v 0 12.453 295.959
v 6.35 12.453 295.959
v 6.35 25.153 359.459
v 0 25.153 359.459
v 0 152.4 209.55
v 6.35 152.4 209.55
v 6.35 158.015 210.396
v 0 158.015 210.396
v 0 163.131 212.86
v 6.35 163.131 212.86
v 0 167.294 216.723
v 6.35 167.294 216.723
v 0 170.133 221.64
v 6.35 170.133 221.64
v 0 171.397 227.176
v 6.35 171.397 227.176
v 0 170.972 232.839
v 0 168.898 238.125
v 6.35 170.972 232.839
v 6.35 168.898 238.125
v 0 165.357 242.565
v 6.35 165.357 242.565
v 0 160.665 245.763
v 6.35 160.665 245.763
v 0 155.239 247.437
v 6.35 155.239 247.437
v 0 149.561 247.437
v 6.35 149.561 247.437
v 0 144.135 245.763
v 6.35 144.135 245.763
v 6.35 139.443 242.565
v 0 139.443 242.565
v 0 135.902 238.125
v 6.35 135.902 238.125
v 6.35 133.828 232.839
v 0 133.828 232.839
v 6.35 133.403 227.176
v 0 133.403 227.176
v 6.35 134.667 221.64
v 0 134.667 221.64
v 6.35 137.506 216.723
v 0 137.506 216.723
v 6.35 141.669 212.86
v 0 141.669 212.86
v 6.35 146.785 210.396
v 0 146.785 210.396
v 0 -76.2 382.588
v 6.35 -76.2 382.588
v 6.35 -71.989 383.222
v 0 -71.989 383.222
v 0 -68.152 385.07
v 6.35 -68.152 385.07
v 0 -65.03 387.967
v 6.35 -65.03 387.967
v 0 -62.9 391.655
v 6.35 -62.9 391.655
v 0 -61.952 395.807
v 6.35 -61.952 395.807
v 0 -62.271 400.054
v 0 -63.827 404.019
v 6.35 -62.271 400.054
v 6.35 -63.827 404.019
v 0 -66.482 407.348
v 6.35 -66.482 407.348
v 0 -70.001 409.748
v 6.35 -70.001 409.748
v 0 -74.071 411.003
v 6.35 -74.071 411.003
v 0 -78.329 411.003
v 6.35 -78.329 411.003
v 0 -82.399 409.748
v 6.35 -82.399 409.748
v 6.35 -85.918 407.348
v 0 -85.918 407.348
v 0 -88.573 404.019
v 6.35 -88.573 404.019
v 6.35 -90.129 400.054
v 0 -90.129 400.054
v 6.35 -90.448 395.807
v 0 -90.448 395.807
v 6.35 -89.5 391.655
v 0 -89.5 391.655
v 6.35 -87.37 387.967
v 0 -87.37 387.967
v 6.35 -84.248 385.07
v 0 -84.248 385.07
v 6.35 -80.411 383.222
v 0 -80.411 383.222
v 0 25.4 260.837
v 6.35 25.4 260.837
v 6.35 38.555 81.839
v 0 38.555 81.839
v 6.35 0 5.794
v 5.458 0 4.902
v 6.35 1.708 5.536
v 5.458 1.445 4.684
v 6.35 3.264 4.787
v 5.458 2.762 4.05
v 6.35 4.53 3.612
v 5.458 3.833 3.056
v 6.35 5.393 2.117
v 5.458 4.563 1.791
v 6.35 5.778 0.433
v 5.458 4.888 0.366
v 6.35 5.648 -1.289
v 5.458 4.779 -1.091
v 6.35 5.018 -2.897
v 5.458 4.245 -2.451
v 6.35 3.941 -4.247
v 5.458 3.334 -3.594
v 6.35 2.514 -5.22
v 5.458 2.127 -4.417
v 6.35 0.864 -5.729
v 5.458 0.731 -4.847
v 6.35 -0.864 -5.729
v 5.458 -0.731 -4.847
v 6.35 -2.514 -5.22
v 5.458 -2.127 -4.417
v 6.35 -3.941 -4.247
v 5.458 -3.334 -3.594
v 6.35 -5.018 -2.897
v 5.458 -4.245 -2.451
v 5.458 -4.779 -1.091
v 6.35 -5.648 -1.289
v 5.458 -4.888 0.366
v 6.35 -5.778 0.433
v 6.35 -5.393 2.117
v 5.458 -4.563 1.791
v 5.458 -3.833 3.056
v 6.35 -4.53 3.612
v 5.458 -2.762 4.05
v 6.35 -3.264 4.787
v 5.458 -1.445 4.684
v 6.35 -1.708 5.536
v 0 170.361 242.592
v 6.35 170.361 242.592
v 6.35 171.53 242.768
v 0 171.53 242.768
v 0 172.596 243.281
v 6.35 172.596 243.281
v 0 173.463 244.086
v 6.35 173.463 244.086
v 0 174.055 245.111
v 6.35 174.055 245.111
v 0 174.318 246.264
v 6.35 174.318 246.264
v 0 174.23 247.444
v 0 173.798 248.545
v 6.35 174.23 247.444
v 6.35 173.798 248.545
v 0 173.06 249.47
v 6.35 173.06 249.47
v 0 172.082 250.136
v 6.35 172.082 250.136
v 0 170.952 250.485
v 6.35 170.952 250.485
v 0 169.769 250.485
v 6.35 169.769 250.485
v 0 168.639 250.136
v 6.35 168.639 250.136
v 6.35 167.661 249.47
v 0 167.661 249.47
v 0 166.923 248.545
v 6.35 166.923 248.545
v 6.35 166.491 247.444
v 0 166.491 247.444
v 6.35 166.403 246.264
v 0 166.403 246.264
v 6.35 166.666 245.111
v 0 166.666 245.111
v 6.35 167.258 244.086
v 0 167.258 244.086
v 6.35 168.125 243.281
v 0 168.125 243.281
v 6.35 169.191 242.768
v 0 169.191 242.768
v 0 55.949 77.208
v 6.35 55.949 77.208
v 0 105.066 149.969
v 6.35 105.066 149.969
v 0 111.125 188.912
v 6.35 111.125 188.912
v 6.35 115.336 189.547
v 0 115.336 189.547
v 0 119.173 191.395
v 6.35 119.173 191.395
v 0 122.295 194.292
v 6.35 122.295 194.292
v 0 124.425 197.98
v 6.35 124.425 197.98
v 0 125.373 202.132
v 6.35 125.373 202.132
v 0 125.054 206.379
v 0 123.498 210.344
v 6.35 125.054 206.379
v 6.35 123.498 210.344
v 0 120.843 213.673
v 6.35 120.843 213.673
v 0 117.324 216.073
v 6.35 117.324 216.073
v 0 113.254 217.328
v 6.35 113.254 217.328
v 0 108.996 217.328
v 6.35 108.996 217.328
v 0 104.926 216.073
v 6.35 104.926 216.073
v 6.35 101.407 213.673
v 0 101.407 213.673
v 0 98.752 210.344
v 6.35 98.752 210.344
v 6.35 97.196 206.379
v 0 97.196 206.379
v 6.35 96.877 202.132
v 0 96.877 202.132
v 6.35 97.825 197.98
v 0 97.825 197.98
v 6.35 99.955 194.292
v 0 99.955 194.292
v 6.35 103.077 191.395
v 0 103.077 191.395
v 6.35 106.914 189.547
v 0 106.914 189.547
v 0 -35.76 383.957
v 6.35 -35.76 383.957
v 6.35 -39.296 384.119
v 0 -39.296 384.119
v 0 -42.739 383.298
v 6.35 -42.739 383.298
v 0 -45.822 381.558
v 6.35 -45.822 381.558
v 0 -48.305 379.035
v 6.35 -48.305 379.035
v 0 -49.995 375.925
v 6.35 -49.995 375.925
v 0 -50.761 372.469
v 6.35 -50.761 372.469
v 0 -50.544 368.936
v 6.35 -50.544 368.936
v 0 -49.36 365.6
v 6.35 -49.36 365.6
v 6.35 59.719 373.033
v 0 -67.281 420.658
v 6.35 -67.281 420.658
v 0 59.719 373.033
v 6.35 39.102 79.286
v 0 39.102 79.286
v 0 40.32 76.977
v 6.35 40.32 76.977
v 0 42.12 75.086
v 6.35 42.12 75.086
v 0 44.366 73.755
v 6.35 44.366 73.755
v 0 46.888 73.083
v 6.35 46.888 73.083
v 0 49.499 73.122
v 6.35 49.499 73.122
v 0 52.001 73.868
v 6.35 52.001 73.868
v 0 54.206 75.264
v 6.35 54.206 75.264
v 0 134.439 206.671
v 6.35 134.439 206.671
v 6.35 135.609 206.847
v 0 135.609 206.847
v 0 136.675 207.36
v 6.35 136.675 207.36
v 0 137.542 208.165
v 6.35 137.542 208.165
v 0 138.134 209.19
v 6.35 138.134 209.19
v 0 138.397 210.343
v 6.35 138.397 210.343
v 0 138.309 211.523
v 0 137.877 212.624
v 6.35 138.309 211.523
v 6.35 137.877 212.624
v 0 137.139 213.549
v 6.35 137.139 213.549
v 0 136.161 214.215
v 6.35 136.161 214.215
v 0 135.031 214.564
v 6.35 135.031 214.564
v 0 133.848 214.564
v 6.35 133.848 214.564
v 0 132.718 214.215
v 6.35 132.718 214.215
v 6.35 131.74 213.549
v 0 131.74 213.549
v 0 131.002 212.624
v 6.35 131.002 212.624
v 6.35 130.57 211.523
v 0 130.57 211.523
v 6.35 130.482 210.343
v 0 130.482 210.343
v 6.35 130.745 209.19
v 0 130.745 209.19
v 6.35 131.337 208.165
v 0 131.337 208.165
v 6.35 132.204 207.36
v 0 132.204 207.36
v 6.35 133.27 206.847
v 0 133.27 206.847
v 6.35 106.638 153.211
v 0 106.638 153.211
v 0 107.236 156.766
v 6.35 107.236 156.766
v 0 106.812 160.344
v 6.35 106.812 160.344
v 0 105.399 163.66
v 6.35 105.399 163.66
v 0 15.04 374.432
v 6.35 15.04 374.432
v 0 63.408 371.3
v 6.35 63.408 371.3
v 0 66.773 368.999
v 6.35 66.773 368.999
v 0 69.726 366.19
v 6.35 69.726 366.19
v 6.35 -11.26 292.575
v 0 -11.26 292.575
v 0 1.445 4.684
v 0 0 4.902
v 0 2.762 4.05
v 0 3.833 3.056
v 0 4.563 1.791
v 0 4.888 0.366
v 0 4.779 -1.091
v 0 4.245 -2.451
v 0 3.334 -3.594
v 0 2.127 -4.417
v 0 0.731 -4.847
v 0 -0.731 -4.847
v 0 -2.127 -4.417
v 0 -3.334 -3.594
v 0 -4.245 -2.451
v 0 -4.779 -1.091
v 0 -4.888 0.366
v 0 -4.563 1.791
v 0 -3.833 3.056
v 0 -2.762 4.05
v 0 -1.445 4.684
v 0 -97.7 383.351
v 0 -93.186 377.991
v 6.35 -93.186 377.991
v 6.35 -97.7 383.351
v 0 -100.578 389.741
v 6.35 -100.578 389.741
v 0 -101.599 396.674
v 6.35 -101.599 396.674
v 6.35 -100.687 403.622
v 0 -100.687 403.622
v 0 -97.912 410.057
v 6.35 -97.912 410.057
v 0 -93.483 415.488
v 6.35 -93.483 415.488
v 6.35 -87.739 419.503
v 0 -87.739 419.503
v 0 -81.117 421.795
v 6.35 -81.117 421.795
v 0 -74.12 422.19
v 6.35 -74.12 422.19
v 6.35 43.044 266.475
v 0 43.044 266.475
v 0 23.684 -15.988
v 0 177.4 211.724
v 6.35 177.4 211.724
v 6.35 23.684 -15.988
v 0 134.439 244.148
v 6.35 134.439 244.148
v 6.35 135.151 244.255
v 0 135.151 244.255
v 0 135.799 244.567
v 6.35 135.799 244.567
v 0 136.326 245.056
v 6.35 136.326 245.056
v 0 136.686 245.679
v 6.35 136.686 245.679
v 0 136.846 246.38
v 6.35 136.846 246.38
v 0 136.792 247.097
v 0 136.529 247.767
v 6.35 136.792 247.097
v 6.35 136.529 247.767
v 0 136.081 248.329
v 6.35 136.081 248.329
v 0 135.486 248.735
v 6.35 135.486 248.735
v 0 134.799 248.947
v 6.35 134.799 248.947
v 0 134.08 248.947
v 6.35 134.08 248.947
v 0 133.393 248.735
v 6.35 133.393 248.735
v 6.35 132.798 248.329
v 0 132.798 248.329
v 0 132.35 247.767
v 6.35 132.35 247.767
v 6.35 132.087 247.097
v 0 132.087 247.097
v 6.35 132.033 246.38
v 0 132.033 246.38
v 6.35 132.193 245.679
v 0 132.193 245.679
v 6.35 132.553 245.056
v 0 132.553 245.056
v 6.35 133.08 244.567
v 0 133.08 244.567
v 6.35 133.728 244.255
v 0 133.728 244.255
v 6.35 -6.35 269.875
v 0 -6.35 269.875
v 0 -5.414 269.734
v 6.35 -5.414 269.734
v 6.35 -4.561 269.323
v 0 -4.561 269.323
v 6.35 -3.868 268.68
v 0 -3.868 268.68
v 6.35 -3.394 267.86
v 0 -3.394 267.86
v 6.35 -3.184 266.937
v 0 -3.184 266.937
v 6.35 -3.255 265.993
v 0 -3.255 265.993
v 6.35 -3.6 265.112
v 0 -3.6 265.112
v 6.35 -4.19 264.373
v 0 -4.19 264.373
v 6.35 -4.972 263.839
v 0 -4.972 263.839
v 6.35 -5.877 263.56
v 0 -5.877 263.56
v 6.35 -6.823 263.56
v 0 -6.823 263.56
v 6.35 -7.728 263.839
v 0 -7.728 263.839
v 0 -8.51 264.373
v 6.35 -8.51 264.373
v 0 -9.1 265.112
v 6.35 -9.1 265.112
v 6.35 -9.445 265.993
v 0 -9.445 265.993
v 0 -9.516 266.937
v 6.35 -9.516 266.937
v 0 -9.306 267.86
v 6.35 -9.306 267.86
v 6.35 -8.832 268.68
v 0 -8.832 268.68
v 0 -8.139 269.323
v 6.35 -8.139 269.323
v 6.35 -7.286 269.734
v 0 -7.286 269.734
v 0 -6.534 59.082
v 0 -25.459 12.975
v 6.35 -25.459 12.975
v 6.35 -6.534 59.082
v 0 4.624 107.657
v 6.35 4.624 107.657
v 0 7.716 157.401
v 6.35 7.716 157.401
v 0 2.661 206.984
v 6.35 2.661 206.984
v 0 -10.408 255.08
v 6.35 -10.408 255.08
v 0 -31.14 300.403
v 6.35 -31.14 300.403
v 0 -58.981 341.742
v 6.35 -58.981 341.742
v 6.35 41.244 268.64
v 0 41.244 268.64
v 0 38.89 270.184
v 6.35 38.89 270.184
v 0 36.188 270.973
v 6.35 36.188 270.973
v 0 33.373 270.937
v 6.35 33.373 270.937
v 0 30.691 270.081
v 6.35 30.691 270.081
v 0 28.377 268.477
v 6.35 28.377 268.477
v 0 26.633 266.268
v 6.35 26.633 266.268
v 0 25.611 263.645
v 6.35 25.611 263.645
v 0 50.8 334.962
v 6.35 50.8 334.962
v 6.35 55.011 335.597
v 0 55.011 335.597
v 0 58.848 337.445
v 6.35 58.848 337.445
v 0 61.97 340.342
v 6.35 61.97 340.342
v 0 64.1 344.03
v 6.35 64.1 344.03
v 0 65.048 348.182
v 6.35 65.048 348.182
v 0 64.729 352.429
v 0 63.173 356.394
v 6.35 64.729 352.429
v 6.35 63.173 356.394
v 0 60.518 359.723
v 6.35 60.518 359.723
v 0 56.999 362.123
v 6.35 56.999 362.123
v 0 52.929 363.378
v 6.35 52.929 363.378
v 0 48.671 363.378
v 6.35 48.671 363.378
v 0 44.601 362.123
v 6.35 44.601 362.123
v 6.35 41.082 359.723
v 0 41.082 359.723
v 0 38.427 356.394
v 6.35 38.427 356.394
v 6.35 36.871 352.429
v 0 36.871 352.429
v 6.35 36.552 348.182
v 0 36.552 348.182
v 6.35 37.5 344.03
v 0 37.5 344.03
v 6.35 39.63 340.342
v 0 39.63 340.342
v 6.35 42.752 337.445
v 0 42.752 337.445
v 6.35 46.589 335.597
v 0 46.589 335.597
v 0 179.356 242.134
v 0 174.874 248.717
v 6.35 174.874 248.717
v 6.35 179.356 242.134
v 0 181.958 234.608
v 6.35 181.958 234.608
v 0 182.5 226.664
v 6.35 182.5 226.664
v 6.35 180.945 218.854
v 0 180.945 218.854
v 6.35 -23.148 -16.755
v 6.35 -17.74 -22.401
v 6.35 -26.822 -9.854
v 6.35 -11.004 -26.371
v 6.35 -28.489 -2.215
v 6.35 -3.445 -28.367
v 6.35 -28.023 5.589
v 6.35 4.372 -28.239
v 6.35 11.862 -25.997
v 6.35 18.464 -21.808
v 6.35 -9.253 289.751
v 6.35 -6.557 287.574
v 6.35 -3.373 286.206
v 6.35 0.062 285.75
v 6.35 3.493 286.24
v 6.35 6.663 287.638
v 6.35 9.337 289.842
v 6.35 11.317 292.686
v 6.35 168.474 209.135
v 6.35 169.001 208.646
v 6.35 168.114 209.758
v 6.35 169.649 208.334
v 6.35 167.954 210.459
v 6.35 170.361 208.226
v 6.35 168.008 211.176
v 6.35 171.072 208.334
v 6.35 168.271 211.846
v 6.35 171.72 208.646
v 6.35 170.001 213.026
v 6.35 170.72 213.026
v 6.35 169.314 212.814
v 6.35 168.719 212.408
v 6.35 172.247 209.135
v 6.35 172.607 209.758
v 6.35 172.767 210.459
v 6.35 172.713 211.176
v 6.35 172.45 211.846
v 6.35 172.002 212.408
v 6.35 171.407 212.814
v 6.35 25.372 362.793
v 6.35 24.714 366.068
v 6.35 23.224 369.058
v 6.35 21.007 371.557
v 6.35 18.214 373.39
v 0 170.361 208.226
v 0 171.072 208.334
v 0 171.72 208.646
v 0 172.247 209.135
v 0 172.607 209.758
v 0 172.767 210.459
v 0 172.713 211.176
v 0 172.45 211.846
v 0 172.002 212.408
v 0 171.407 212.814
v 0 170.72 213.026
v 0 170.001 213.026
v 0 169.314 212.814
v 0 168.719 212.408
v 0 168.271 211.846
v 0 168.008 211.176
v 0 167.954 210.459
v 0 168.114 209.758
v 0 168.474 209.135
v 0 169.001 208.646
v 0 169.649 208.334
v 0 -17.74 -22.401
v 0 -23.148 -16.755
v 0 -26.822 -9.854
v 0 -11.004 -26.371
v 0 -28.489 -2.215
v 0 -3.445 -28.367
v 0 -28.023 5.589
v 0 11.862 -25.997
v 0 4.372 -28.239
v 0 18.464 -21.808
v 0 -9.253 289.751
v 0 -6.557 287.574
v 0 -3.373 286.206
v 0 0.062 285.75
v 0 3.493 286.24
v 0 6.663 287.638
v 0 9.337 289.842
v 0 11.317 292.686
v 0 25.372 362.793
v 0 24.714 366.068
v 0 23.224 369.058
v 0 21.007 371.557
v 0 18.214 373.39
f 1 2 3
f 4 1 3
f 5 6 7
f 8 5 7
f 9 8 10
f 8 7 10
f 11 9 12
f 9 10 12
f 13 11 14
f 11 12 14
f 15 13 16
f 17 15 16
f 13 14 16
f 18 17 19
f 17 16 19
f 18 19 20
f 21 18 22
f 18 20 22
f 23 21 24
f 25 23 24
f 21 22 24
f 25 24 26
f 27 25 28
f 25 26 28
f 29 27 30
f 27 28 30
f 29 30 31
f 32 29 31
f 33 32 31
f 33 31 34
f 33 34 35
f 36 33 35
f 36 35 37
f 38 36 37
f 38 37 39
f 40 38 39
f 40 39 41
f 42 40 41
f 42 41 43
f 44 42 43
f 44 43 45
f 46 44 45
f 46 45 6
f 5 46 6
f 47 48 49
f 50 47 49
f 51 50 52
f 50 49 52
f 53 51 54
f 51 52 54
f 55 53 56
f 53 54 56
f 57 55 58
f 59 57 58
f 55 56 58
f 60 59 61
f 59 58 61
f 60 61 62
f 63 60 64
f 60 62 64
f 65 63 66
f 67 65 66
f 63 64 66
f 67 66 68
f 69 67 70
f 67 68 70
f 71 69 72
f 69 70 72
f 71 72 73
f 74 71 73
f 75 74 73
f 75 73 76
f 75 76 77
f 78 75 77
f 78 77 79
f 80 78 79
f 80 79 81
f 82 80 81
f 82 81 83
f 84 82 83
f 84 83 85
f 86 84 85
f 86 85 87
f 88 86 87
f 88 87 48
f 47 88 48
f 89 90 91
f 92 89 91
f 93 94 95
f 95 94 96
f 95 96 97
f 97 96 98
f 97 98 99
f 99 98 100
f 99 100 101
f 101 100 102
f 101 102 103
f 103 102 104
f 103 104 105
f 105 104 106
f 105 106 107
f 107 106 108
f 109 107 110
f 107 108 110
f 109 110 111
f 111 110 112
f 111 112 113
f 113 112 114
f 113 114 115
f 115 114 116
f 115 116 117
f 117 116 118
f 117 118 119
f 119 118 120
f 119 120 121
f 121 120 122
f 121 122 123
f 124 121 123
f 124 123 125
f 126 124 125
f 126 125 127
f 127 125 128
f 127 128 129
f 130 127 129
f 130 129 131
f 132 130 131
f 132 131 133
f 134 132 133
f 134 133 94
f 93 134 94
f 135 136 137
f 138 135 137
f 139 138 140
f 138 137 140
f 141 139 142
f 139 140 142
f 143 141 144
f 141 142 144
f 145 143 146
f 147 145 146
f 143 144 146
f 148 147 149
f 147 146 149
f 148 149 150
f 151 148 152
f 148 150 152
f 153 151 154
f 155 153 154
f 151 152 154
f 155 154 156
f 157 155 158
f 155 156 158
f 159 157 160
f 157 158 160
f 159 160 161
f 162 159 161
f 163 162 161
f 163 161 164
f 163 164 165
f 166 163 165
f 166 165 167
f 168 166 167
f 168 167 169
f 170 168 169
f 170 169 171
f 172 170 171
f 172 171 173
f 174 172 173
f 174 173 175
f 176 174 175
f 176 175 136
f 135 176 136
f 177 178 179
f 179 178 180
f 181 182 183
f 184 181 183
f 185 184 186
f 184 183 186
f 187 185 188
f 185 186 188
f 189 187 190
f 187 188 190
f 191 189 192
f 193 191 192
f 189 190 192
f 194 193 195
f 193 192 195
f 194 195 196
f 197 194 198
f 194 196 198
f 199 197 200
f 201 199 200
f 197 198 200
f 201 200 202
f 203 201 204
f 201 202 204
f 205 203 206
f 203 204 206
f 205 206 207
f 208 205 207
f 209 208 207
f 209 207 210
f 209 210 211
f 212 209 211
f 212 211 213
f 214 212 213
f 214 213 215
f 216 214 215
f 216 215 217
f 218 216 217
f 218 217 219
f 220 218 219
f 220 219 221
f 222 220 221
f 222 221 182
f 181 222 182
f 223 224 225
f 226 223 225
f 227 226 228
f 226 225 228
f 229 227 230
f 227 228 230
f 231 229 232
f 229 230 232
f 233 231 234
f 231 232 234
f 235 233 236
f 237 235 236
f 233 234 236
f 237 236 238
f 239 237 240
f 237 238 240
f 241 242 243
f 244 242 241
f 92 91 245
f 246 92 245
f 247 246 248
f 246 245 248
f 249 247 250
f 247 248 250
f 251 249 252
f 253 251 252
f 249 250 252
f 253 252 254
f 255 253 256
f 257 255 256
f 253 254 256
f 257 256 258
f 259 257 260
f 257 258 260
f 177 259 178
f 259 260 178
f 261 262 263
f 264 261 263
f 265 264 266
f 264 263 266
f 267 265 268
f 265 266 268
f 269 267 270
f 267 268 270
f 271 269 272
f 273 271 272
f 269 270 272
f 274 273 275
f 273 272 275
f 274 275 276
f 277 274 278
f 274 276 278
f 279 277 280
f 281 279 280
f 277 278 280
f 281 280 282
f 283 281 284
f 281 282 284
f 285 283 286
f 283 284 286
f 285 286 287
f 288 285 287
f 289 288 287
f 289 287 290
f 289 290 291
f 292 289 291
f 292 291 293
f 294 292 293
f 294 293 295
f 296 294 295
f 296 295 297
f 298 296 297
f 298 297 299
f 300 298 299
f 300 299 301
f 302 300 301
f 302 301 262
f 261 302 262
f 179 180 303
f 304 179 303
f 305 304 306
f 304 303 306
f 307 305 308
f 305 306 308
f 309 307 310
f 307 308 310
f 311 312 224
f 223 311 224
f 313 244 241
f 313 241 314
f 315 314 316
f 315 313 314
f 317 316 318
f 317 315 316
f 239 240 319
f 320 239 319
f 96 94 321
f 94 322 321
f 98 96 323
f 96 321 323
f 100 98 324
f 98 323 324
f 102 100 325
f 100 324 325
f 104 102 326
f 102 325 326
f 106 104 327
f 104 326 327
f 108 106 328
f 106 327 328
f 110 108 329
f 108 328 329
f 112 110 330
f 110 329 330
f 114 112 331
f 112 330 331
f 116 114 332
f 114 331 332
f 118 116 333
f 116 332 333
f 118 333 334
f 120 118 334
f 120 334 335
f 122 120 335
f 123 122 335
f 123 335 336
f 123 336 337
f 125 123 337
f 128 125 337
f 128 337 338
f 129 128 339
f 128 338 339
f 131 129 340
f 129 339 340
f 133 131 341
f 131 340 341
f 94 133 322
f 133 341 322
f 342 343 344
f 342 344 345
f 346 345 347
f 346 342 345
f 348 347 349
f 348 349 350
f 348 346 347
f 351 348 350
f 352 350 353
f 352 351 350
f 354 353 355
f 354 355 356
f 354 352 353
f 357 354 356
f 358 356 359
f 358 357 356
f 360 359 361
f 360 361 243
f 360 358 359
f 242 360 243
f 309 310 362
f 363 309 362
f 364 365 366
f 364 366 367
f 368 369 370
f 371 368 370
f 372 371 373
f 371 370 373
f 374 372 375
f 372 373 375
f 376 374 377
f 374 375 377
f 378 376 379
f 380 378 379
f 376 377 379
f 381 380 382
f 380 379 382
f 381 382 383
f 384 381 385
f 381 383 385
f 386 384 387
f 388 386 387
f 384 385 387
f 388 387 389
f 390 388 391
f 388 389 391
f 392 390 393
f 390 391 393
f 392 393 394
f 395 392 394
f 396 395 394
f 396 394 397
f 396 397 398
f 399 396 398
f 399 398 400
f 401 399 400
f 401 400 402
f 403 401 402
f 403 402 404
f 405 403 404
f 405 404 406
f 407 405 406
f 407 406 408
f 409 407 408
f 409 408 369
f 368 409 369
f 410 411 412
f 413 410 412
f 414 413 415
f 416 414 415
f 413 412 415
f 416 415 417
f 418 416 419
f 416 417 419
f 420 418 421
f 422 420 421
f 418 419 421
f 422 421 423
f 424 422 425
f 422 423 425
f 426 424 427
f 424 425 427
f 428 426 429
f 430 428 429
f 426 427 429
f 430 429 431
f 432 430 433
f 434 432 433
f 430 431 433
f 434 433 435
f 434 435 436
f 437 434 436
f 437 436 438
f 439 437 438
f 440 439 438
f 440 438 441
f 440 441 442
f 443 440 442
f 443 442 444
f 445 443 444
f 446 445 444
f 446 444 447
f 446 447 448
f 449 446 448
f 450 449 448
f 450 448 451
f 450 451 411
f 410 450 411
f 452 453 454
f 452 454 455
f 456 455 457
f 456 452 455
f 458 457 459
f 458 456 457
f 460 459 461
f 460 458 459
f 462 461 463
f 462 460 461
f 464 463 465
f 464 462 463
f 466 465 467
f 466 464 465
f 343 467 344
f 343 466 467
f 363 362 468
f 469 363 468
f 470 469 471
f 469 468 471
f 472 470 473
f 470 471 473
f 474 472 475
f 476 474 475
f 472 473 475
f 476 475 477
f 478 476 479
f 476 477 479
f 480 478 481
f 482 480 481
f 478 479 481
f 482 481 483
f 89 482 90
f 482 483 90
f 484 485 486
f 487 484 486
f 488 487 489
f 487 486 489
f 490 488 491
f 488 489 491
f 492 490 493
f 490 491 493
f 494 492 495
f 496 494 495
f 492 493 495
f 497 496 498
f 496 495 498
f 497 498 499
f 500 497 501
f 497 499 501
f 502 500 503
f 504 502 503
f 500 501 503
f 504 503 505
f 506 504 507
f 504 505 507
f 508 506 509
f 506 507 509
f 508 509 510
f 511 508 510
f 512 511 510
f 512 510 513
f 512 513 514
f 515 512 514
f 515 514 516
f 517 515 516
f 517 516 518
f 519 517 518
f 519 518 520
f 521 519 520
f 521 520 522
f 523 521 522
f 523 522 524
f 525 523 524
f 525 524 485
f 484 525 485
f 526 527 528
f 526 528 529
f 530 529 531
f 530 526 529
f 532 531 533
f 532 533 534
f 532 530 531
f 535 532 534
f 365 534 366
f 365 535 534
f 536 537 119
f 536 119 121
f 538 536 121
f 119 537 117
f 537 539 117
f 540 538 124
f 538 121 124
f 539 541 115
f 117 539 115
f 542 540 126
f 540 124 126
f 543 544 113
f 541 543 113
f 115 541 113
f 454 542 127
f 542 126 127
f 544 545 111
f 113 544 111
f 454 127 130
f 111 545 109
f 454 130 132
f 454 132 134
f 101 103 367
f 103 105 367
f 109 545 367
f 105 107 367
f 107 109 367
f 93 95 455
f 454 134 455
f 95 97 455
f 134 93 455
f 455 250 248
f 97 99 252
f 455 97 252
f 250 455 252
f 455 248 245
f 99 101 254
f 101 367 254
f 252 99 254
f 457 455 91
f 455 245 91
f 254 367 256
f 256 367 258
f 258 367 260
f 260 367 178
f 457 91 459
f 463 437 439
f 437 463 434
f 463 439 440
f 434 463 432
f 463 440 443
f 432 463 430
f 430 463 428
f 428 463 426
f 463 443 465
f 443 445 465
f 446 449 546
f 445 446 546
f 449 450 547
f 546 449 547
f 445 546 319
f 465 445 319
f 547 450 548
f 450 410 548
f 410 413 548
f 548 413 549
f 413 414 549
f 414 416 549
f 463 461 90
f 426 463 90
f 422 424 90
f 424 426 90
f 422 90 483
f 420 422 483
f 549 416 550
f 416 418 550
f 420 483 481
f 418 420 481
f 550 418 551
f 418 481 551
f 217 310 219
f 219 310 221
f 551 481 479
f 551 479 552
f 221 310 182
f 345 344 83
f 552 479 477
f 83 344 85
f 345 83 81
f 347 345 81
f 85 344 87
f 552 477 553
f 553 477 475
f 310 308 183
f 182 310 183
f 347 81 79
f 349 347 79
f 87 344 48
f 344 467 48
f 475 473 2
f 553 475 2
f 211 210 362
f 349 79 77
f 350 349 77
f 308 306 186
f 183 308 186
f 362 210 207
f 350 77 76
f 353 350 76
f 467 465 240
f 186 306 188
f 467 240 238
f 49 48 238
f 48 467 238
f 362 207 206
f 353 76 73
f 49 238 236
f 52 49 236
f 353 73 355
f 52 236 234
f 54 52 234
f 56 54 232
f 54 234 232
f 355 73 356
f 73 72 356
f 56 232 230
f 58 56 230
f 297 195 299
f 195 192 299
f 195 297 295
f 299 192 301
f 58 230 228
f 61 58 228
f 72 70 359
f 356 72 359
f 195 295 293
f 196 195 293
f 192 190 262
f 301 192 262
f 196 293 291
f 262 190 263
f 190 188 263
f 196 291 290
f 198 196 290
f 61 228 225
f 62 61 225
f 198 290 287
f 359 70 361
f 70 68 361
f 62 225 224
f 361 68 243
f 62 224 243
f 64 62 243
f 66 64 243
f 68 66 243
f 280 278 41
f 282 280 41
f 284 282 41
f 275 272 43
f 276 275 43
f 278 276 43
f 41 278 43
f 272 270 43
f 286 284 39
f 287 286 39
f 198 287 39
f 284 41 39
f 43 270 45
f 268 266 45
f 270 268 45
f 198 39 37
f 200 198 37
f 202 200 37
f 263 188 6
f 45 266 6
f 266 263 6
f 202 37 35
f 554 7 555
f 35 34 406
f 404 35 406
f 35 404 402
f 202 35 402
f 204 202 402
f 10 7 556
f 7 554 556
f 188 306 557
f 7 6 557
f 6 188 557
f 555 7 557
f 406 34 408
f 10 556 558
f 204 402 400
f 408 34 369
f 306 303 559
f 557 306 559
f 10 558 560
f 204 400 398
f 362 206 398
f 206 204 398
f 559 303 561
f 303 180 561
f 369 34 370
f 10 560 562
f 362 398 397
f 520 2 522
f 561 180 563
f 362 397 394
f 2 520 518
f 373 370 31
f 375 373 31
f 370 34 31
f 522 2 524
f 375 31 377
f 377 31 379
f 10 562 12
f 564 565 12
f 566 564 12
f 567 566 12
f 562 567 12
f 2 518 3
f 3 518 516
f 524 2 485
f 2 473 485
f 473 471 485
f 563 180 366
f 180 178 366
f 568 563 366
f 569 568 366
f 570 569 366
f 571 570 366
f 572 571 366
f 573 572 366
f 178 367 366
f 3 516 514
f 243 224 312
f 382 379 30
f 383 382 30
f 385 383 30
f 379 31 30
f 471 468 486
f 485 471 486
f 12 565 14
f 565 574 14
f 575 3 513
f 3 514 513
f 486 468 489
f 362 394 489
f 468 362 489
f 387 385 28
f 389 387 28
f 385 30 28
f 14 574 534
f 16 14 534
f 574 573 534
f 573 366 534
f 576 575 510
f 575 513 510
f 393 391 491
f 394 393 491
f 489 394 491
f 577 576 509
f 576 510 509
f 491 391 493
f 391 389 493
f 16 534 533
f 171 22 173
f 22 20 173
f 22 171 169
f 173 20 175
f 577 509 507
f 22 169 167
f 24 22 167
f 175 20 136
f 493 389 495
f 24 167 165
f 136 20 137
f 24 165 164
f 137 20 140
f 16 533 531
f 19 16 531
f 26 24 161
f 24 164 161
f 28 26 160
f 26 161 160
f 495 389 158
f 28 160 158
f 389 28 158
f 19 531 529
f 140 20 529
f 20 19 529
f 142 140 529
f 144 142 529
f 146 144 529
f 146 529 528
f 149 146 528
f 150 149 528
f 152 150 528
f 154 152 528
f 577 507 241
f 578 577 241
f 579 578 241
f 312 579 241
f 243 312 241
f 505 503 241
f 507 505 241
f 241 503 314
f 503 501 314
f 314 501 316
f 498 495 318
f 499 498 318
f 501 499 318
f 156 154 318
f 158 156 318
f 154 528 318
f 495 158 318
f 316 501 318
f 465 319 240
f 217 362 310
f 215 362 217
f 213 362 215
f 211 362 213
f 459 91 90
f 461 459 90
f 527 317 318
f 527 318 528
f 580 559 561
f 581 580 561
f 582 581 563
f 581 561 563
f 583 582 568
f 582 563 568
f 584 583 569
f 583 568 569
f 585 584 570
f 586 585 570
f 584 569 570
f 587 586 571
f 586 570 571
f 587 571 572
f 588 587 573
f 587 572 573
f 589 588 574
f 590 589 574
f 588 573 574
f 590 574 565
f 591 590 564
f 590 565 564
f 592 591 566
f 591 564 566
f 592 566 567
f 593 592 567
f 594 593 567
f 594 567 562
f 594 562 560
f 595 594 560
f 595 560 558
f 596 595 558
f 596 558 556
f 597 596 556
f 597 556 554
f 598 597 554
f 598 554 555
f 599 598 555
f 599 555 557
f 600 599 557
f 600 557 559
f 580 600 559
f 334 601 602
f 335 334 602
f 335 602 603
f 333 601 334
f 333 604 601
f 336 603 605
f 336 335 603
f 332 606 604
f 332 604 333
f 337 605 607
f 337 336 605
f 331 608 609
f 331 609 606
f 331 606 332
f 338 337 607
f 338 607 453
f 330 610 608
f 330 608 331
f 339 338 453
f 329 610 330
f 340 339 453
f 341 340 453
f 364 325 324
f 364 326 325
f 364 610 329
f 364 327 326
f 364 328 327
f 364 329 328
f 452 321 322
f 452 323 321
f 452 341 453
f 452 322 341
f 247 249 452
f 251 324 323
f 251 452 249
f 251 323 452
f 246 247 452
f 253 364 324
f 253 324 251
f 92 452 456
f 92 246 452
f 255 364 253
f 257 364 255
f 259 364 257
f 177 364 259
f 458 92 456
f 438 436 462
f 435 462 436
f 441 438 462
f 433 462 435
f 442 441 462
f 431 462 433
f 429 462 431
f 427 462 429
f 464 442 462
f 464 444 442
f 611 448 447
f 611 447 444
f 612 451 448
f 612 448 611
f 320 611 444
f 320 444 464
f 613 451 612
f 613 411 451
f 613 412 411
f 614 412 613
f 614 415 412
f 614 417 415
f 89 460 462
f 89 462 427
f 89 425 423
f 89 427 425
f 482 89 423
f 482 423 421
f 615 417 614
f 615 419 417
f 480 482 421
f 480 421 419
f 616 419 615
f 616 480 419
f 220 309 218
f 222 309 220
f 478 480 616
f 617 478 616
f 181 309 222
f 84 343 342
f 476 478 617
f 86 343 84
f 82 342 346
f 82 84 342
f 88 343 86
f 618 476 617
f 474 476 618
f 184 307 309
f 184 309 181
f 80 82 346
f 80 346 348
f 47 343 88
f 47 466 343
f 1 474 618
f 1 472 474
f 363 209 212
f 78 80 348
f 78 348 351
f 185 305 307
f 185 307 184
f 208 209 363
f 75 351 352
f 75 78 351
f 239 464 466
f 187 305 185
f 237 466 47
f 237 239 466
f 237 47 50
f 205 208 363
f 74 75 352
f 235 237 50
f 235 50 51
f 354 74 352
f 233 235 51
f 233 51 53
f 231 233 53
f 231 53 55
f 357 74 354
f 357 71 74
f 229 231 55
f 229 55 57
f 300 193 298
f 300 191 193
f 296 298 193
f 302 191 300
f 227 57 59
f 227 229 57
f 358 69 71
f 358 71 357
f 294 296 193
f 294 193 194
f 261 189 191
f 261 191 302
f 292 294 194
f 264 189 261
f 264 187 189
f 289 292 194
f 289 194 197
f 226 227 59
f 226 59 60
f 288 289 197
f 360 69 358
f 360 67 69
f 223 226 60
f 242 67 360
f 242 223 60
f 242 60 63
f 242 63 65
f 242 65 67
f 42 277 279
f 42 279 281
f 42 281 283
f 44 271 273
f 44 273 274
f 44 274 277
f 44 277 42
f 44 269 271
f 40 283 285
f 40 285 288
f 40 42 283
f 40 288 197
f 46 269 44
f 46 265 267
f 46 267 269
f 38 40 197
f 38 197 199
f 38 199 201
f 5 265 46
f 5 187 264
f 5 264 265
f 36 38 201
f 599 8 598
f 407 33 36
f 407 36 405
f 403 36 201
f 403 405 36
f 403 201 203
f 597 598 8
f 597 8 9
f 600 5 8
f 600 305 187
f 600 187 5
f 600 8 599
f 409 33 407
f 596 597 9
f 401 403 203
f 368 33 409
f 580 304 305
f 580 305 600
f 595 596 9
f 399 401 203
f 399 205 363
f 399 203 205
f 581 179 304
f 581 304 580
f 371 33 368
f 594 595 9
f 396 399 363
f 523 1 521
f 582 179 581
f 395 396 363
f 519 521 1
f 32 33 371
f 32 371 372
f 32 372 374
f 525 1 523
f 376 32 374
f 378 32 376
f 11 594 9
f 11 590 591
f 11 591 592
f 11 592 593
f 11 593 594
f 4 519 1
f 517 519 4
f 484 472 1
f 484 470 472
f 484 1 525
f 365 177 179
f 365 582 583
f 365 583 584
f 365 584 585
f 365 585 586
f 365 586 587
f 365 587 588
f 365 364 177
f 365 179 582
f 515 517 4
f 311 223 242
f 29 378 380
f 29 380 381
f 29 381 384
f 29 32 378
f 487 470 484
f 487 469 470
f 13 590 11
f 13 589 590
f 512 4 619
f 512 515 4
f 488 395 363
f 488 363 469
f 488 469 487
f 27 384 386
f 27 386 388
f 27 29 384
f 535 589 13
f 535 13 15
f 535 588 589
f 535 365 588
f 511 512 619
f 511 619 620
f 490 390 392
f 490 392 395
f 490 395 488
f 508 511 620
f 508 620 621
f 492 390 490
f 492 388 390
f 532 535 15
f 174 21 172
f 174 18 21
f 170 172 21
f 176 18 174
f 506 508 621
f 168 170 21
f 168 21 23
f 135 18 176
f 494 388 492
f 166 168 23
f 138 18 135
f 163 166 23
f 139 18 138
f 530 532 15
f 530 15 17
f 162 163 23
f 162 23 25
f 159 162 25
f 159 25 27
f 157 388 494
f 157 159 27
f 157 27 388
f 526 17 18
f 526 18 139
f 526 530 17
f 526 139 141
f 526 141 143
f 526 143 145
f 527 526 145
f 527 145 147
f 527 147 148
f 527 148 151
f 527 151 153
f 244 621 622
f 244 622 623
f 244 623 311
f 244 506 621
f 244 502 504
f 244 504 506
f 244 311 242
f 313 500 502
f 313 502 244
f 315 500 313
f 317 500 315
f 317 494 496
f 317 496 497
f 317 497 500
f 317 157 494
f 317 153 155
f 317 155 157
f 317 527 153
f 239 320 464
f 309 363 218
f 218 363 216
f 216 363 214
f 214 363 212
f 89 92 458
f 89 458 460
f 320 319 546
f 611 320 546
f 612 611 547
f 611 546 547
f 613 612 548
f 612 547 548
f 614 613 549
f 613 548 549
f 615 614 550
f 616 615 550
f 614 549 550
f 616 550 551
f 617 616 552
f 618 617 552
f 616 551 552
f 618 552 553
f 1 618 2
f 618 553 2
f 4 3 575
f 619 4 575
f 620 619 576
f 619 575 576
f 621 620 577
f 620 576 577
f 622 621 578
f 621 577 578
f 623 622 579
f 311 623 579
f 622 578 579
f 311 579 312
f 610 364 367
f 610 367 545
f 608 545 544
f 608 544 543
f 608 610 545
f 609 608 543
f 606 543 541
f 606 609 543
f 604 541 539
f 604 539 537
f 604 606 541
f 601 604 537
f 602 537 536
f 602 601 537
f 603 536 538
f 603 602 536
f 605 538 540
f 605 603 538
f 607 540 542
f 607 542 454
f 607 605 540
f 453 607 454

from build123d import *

# Parameters (mm, degrees)
BOSS_EXTRUDE1_DEPTH               = 6.35
CUT_EXTRUDE1_REACH                = 8.35
SKETCH3_R                         = 14.2875
SKETCH3_R_2                       = 19.05
SKETCH3_R_3                       = 2.413
SKETCH3_R_4                       = 3.96875
F_3_8_CLEARANCE_HOLE2_D           = 9.8044
F_3_8_CLEARANCE_HOLE2_CSINK_D     = 11.58748
F_3_8_CLEARANCE_HOLE2_CSINK_ANGLE = 90
F_1_4_0_2500_DOWEL_HOLE2_D        = 6.35
CUT_EXTRUDE2_DEPTH                = 7.35


with BuildPart() as part:
    # Sketch2 → Boss-Extrude1 (new body)
    with BuildSketch(Plane(origin=(0, 0, 0), x_dir=(0, 0, -1), z_dir=(1, 0, 0))):
        with BuildLine():
            Line((-420.65776111, -67.281464584), (-373.03276111, 59.718535416))
            ThreePointArc((-373.03276111, 59.718535416), (-370.217283815, 65.136422477), (-366.190217158, 69.725882876))
            Line((-366.190217158, 69.725882876), (-248.716507876, 174.874485915))
            ThreePointArc((-248.716507876, 174.874485915), (-230.65414247, 182.492472563), (-211.724122614, 177.399623371))
            Line((-211.724122614, 177.399623371), (15.987673313, 23.68385372))
            ThreePointArc((15.987673313, 23.68385372), (24.617664495, -14.508660165), (-12.975284095, -25.459234624))
            ThreePointArc((-12.975284095, -25.459234624), (-206.983757432, 2.660555148), (-377.990639572, -93.186492612))
            ThreePointArc((-377.990639572, -93.186492612), (-410.057040874, -97.911605155), (-420.65776111, -67.281464584))
        make_face()
    extrude(amount=BOSS_EXTRUDE1_DEPTH)

    # Sketch3 → Cut-Extrude1 (cut, up to next)
    with BuildSketch(Plane(origin=(6.35, 0, 0), x_dir=(0, 0, -1), z_dir=(1, 0, 0)), mode=Mode.PRIVATE) as cut_extrude1_sk1:
        with Locations((-203.2, 111.125)):
            Circle(SKETCH3_R)
    cut_extrude1_tool1 = extrude(cut_extrude1_sk1.sketch, amount=-CUT_EXTRUDE1_REACH, mode=Mode.PRIVATE) & part.part
    add(cut_extrude1_tool1.solids().sort_by_distance((6.35, 111.125, 203.2))[0], mode=Mode.SUBTRACT)
    # Sketch3 → Cut-Extrude1 (cut, up to next)
    with BuildSketch(Plane(origin=(6.35, 0, 0), x_dir=(0, 0, -1), z_dir=(1, 0, 0)), mode=Mode.PRIVATE) as cut_extrude1_sk2:
        with Locations((-349.25, 50.8)):
            Circle(SKETCH3_R)
    cut_extrude1_tool2 = extrude(cut_extrude1_sk2.sketch, amount=-CUT_EXTRUDE1_REACH, mode=Mode.PRIVATE) & part.part
    add(cut_extrude1_tool2.solids().sort_by_distance((6.35, 50.8, 349.25))[0], mode=Mode.SUBTRACT)
    # Sketch3 → Cut-Extrude1 (cut, up to next)
    with BuildSketch(Plane(origin=(6.35, 0, 0), x_dir=(0, 0, -1), z_dir=(1, 0, 0)), mode=Mode.PRIVATE) as cut_extrude1_sk3:
        with Locations((-396.875, -76.2)):
            Circle(SKETCH3_R)
    cut_extrude1_tool3 = extrude(cut_extrude1_sk3.sketch, amount=-CUT_EXTRUDE1_REACH, mode=Mode.PRIVATE) & part.part
    add(cut_extrude1_tool3.solids().sort_by_distance((6.35, -76.2, 396.875))[0], mode=Mode.SUBTRACT)
    # Sketch3 → Cut-Extrude1 (cut, up to next)
    with BuildSketch(Plane(origin=(6.35, 0, 0), x_dir=(0, 0, -1), z_dir=(1, 0, 0)), mode=Mode.PRIVATE) as cut_extrude1_sk4:
        with Locations((-228.6, 152.4)):
            Circle(SKETCH3_R_2)
    cut_extrude1_tool4 = extrude(cut_extrude1_sk4.sketch, amount=-CUT_EXTRUDE1_REACH, mode=Mode.PRIVATE) & part.part
    add(cut_extrude1_tool4.solids().sort_by_distance((6.35, 152.4, 228.6))[0], mode=Mode.SUBTRACT)
    # Sketch3 → Cut-Extrude1 (cut, up to next)
    with BuildSketch(Plane(origin=(6.35, 0, 0), x_dir=(0, 0, -1), z_dir=(1, 0, 0)), mode=Mode.PRIVATE) as cut_extrude1_sk5:
        with Locations((-246.560512242, 134.439487758)):
            Circle(SKETCH3_R_3)
    cut_extrude1_tool5 = extrude(cut_extrude1_sk5.sketch, amount=-CUT_EXTRUDE1_REACH, mode=Mode.PRIVATE) & part.part
    add(cut_extrude1_tool5.solids().sort_by_distance((6.35, 134.439488, 246.560512))[0], mode=Mode.SUBTRACT)
    # Sketch3 → Cut-Extrude1 (cut, up to next)
    with BuildSketch(Plane(origin=(6.35, 0, 0), x_dir=(0, 0, -1), z_dir=(1, 0, 0)), mode=Mode.PRIVATE) as cut_extrude1_sk6:
        with Locations((-210.639487758, 134.439487758)):
            Circle(SKETCH3_R_4)
    cut_extrude1_tool6 = extrude(cut_extrude1_sk6.sketch, amount=-CUT_EXTRUDE1_REACH, mode=Mode.PRIVATE) & part.part
    add(cut_extrude1_tool6.solids().sort_by_distance((6.35, 134.439488, 210.639488))[0], mode=Mode.SUBTRACT)
    # Sketch3 → Cut-Extrude1 (cut, up to next)
    with BuildSketch(Plane(origin=(6.35, 0, 0), x_dir=(0, 0, -1), z_dir=(1, 0, 0)), mode=Mode.PRIVATE) as cut_extrude1_sk7:
        with Locations((-210.639487758, 170.360512242)):
            Circle(SKETCH3_R_3)
    cut_extrude1_tool7 = extrude(cut_extrude1_sk7.sketch, amount=-CUT_EXTRUDE1_REACH, mode=Mode.PRIVATE) & part.part
    add(cut_extrude1_tool7.solids().sort_by_distance((6.35, 170.360512, 210.639488))[0], mode=Mode.SUBTRACT)
    # Sketch3 → Cut-Extrude1 (cut, up to next)
    with BuildSketch(Plane(origin=(6.35, 0, 0), x_dir=(0, 0, -1), z_dir=(1, 0, 0)), mode=Mode.PRIVATE) as cut_extrude1_sk8:
        with Locations((-246.560512242, 170.360512242)):
            Circle(SKETCH3_R_4)
    cut_extrude1_tool8 = extrude(cut_extrude1_sk8.sketch, amount=-CUT_EXTRUDE1_REACH, mode=Mode.PRIVATE) & part.part
    add(cut_extrude1_tool8.solids().sort_by_distance((6.35, 170.360512, 246.560512))[0], mode=Mode.SUBTRACT)

    # 3/8 Clearance Hole2 (through all)
    with Locations(Plane(origin=(6.35, 0, 0), x_dir=(0, 0, -1), z_dir=(1, 0, 0))):
        with Locations((0, 0)):
            CounterSinkHole(F_3_8_CLEARANCE_HOLE2_D / 2, F_3_8_CLEARANCE_HOLE2_CSINK_D / 2, counter_sink_angle=F_3_8_CLEARANCE_HOLE2_CSINK_ANGLE)

    # 1/4 (0.2500) Dowel Hole2 (through all)
    with Locations(Plane(origin=(6.35, 0, 0), x_dir=(0, 0, -1), z_dir=(1, 0, 0))):
        with Locations((-266.7, -6.35)):
            Hole(F_1_4_0_2500_DOWEL_HOLE2_D / 2)

    # Sketch14 → Cut-Extrude2 (cut, through all)
    with BuildSketch(Plane(origin=(6.35, 0, 0), x_dir=(0, 0, -1), z_dir=(1, 0, 0))):
        with BuildLine():
            Line((-365.600411715, -49.359627546), (-292.575411715, -11.259627546))
            ThreePointArc((-292.575411715, -11.259627546), (-285.877370021, 1.794150333), (-295.959325084, 12.453374581))
            Line((-295.959325084, 12.453374581), (-359.459325084, 25.153374581))
            ThreePointArc((-359.459325084, 25.153374581), (-369.058218075, 23.224411423), (-374.432476774, 15.040464395))
            Line((-374.432476774, 15.040464395), (-383.957476774, -35.759535605))
            ThreePointArc((-383.957476774, -35.759535605), (-379.035203223, -48.304573838), (-365.600411715, -49.359627546))
        make_face()
        with BuildLine():
            Line((-77.20752162, 55.949267111), (-149.968519497, 105.066234213))
            ThreePointArc((-149.968519497, 105.066234213), (-156.765517001, 107.236326229), (-163.659929975, 105.39906082))
            Line((-163.659929975, 105.39906082), (-266.47492871, 43.043617869))
            ThreePointArc((-266.47492871, 43.043617869), (-270.608700361, 32.000347521), (-260.837451688, 25.4))
            Line((-260.837451688, 25.4), (-81.838602457, 38.555269198))
            ThreePointArc((-81.838602457, 38.555269198), (-73.332394792, 45.604028308), (-77.20752162, 55.949267111))
        make_face()
    extrude(amount=-CUT_EXTRUDE2_DEPTH, mode=Mode.SUBTRACT)


solid = part.part
